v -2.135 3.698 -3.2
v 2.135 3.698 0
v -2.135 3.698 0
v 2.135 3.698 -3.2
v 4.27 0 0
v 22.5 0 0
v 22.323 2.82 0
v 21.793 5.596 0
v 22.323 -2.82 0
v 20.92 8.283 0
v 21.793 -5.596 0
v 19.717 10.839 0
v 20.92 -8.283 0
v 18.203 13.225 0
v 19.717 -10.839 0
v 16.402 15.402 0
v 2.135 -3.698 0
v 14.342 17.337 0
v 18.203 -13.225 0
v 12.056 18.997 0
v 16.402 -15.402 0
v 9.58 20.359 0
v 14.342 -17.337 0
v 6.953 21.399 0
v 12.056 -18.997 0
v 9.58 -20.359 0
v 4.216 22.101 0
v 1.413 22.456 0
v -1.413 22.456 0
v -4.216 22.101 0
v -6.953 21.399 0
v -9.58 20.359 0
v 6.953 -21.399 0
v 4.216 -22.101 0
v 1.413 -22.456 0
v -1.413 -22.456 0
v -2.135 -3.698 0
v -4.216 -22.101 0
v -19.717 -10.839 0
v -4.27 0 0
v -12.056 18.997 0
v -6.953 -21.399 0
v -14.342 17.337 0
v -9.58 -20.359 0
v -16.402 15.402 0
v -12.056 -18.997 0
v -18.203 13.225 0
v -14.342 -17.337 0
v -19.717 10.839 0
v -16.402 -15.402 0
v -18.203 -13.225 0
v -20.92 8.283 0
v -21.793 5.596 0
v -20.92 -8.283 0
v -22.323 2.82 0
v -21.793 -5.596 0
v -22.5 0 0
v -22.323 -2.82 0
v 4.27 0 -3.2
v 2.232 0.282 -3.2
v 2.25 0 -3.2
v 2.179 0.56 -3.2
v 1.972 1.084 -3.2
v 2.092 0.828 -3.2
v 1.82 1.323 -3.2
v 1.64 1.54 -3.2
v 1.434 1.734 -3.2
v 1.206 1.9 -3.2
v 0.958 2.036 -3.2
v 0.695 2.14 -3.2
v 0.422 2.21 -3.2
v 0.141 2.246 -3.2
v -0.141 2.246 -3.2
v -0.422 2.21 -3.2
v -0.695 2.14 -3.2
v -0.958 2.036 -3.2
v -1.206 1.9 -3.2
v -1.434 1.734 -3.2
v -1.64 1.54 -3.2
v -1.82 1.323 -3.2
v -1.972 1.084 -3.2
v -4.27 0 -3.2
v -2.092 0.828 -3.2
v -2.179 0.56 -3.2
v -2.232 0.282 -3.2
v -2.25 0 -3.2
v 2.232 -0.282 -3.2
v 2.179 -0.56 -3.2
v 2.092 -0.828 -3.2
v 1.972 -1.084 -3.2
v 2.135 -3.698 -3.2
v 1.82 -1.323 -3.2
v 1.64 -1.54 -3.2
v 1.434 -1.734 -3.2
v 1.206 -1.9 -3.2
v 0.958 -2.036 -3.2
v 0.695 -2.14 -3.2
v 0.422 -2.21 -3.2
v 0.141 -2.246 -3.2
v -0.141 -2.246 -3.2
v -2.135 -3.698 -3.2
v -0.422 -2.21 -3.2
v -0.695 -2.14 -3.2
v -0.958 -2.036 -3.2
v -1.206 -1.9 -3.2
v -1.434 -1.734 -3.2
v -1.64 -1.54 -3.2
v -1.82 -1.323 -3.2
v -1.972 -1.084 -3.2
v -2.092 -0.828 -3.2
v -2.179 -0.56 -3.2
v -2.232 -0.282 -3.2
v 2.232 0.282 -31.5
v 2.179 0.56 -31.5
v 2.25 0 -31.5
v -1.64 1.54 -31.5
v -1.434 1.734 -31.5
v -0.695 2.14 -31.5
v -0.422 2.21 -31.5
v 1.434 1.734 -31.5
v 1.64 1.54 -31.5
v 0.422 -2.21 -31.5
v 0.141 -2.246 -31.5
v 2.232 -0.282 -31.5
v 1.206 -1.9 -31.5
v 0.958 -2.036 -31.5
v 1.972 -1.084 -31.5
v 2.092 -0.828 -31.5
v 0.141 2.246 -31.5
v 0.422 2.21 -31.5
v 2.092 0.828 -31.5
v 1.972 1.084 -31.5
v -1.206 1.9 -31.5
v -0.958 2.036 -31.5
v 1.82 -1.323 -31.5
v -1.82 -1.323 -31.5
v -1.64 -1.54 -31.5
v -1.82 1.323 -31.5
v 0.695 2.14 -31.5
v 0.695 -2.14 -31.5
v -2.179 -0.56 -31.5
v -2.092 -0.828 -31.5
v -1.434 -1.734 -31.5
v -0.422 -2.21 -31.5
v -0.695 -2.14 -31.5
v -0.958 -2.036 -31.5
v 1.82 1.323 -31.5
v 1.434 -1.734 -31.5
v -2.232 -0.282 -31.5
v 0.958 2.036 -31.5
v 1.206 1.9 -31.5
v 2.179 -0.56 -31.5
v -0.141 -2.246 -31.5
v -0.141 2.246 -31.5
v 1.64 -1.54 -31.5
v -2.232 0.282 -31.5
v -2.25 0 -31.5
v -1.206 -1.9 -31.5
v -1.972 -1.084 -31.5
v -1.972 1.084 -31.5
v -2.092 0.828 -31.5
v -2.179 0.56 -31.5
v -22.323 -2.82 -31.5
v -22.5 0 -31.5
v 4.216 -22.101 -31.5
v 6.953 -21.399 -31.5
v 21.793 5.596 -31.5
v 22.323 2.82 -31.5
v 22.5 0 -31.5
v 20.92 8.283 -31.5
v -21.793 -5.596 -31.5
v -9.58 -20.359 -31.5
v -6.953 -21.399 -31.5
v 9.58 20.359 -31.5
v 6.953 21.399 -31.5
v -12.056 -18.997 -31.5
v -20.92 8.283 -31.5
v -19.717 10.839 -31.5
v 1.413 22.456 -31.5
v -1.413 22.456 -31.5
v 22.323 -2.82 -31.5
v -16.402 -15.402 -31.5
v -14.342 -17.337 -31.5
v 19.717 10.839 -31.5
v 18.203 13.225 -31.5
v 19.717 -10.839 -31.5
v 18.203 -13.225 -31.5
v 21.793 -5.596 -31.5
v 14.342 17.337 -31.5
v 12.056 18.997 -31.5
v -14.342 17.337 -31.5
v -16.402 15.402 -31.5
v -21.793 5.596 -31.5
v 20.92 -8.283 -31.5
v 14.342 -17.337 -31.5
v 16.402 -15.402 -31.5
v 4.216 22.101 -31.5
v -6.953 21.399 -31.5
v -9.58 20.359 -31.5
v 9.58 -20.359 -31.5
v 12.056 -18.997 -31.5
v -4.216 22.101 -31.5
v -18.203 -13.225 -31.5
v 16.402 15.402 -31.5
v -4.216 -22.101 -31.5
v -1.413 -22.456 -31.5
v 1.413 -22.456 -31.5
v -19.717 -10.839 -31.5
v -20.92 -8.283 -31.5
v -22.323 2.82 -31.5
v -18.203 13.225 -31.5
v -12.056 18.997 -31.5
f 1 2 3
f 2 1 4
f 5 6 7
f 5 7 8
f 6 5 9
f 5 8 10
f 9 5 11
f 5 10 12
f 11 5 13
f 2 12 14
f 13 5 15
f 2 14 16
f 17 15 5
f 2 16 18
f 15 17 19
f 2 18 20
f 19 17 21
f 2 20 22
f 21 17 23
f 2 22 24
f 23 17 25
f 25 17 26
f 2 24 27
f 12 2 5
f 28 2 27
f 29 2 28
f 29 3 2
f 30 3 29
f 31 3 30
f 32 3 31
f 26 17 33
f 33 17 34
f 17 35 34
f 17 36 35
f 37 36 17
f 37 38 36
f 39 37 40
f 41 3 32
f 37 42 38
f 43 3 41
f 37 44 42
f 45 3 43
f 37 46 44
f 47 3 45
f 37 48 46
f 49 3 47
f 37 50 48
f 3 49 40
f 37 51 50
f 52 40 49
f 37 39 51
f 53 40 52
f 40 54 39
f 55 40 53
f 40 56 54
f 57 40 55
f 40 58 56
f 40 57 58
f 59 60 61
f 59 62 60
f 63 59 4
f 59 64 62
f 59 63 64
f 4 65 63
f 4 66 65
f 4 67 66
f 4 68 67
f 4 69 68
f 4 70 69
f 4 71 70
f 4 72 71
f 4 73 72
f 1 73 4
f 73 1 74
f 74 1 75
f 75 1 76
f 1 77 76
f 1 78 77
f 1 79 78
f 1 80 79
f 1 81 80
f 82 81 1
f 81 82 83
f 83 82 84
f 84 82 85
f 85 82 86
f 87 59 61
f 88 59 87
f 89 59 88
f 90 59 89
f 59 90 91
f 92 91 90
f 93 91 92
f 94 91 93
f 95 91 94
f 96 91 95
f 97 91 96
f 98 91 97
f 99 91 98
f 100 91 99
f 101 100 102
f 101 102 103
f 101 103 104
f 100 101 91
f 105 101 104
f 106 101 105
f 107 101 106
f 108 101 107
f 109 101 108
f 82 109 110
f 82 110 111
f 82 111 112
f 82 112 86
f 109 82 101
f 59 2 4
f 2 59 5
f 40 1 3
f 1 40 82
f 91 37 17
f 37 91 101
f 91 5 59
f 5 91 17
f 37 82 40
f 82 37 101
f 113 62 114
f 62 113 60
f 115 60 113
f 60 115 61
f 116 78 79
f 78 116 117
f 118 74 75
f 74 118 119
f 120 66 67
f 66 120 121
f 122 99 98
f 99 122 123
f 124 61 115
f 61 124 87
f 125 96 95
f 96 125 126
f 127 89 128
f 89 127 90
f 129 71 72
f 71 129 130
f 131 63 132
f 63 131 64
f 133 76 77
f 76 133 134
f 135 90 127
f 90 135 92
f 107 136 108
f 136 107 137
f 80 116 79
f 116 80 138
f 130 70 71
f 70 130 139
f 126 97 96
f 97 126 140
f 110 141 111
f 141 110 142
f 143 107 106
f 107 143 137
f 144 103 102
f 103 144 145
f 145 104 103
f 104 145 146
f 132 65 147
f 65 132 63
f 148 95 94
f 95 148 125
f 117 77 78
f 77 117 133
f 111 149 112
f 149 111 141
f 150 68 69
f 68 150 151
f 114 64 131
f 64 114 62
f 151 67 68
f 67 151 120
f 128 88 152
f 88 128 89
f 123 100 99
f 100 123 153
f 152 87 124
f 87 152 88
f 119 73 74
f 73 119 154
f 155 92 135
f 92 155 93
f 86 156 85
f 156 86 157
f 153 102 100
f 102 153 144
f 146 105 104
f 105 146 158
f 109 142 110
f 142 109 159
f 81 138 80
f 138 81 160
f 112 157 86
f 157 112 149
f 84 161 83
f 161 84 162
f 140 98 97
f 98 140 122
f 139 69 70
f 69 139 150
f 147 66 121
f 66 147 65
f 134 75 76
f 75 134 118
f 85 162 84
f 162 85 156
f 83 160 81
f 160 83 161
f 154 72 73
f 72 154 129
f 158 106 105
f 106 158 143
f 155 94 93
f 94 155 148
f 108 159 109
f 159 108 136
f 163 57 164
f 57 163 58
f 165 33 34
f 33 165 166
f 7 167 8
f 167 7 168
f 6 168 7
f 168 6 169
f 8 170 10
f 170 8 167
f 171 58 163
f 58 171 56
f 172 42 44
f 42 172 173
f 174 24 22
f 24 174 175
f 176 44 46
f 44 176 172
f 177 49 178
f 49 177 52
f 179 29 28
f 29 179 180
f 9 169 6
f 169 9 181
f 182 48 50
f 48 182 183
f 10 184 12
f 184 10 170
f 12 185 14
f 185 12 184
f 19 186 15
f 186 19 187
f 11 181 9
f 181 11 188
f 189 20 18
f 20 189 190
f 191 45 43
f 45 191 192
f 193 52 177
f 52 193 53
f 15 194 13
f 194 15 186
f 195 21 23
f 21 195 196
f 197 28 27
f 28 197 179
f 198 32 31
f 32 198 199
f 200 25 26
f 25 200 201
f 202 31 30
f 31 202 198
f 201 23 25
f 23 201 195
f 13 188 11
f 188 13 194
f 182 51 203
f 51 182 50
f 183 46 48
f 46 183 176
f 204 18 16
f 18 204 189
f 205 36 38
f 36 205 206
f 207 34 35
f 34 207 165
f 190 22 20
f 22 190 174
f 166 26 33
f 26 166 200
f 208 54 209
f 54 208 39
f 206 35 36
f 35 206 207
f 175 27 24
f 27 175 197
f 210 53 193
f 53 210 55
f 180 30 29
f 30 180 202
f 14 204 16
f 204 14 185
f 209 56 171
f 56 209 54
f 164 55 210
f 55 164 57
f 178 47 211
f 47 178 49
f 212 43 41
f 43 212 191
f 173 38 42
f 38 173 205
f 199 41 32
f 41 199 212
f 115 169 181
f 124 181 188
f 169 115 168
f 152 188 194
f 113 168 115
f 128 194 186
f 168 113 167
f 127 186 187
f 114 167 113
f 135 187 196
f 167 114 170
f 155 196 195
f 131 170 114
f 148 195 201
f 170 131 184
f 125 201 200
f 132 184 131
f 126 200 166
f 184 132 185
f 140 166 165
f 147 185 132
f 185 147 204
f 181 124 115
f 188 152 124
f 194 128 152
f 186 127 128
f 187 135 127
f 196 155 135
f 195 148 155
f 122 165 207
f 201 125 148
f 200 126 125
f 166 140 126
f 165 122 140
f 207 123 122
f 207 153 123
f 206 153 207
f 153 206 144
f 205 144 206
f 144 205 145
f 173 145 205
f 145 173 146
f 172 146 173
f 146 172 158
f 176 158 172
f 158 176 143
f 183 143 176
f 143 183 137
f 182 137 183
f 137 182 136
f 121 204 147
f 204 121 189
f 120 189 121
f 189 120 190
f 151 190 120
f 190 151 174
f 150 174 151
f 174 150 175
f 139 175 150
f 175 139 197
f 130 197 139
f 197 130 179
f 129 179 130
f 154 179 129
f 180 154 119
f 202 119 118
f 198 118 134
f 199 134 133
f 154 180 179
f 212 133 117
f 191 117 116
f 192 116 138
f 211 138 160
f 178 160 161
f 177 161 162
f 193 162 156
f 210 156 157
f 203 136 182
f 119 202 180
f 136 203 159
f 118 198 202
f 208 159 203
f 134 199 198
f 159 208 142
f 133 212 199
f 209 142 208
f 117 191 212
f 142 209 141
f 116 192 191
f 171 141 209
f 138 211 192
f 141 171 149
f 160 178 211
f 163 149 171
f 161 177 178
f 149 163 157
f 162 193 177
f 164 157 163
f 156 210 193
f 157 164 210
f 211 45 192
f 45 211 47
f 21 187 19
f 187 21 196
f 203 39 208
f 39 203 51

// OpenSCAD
$fn = 50;


difference() {
	union() {
		translate(v = [0, 0, -31.5000000000]) {
			cylinder(h = 31.5000000000, r = 22.5000000000);
		}
	}
	union() {
		translate(v = [0, 0, 0]) {
			rotate(a = [0, 0, 0]) {
				difference() {
					union() {
						translate(v = [0, 0, -3.2000000000]) {
							linear_extrude(height = 3.2000000000) {
								polygon(points = [[4.2698000000, 0.0000000000], [2.1349000000, 3.6977552691], [-2.1349000000, 3.6977552691], [-4.2698000000, 0.0000000000], [-2.1349000000, -3.6977552691], [2.1349000000, -3.6977552691]]);
							}
						}
					}
					union();
				}
			}
		}
		#translate(v = [0, 0, -100.0000000000]) {
			cylinder(h = 200, r = 2.2500000000);
		}
	}
}
